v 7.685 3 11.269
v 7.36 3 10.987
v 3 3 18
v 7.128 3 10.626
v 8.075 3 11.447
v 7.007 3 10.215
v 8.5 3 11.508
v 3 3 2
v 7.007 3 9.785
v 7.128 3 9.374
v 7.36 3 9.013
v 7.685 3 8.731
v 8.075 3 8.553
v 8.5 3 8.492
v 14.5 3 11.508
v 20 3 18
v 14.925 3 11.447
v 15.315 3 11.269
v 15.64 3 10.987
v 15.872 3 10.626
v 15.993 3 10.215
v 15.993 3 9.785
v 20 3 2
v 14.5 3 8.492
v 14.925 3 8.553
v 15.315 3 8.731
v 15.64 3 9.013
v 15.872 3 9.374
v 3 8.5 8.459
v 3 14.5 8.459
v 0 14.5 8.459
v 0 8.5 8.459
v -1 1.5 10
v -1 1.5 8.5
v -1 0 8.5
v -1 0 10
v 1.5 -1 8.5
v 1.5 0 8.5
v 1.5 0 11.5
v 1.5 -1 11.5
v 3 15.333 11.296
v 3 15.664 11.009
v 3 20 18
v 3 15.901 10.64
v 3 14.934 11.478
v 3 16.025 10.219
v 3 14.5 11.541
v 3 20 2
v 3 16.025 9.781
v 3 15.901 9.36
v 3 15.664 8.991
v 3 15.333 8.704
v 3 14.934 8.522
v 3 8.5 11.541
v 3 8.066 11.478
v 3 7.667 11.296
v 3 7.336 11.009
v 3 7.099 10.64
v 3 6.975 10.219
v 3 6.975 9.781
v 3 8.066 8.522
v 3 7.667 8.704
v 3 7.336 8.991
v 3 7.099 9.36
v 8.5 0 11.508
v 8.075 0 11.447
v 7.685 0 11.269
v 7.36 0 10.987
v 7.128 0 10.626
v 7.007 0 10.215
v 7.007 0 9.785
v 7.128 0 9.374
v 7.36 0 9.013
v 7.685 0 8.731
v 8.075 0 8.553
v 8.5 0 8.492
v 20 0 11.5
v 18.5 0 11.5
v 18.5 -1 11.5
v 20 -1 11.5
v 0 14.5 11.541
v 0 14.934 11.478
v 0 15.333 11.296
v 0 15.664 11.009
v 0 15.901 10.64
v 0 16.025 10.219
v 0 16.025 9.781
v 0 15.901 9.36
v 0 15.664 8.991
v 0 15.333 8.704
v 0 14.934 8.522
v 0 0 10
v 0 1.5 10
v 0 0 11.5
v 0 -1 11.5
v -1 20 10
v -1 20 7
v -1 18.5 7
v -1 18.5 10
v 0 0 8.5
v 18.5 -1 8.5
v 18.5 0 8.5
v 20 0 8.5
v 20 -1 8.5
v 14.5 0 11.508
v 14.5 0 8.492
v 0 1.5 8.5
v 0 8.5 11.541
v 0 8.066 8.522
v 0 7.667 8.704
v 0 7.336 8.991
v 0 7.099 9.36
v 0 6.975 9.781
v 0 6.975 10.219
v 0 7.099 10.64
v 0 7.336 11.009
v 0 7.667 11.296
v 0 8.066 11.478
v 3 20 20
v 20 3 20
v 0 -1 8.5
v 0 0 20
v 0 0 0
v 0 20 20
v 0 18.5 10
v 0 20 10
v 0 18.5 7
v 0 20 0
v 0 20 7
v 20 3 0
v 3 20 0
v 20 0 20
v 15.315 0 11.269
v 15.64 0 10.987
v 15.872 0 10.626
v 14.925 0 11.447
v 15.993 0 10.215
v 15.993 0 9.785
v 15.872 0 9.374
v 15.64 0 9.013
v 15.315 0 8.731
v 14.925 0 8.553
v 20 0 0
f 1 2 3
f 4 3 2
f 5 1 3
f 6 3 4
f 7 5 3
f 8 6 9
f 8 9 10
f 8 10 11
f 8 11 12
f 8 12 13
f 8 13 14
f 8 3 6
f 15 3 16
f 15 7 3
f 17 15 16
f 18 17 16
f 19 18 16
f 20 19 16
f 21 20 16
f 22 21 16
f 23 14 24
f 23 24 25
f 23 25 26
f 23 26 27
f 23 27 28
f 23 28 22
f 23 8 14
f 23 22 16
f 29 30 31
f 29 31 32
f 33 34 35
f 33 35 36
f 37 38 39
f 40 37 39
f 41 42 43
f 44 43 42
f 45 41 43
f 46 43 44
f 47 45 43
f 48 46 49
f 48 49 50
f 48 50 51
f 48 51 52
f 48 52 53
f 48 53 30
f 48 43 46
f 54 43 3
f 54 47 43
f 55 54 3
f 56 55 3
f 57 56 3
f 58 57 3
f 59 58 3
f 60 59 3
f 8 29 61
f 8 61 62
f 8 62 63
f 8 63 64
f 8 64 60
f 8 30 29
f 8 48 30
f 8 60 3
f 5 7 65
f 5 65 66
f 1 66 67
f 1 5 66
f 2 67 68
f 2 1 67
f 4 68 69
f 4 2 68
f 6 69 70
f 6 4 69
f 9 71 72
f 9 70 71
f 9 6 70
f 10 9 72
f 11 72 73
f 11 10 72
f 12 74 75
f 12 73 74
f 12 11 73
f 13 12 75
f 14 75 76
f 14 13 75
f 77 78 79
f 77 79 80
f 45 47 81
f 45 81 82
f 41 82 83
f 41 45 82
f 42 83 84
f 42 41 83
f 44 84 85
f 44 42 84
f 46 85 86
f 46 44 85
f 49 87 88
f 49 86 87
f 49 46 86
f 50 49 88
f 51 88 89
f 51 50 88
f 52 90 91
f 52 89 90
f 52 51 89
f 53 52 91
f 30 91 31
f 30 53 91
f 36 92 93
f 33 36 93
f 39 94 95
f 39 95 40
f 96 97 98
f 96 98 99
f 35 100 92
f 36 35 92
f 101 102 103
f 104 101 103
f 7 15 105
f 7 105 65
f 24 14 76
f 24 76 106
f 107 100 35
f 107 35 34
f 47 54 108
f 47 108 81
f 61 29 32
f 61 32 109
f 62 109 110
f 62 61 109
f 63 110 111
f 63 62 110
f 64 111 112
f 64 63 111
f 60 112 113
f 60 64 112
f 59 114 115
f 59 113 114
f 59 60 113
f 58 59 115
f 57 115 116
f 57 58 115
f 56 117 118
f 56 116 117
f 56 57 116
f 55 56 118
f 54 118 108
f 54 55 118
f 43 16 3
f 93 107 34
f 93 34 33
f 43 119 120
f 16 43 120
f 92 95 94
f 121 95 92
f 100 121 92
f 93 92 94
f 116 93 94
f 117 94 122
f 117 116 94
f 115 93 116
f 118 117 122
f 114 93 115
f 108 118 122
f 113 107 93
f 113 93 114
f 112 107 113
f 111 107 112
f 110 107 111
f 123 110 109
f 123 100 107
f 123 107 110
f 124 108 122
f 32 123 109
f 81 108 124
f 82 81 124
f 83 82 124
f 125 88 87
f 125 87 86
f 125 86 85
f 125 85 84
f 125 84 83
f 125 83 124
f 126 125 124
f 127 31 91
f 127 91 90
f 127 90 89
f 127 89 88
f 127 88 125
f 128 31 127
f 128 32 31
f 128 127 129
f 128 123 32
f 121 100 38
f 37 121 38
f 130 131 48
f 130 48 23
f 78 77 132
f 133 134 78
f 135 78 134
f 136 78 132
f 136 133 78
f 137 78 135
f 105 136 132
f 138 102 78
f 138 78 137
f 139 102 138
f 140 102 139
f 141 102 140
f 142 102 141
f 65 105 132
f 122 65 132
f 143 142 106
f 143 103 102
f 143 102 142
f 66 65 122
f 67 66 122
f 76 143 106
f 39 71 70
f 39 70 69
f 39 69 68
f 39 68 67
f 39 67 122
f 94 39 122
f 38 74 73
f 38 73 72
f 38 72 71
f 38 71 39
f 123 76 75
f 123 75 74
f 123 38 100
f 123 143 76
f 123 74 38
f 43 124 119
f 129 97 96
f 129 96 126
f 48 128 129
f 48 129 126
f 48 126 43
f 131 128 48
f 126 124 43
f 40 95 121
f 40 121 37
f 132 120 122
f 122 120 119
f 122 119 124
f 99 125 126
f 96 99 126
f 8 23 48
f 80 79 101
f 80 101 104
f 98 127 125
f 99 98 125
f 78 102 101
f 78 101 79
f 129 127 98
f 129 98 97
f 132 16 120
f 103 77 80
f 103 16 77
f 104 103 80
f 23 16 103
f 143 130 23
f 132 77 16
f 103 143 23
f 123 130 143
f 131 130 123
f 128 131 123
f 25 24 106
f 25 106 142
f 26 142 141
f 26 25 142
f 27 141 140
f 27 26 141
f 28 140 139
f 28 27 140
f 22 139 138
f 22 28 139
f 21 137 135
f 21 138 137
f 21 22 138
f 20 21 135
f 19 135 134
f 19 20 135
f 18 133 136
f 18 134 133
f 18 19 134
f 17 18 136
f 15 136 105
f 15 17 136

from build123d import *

# Parameters (mm, degrees)
SALIENTE_EXTRUIR1_DEPTH = 20
SALIENTE_EXTRUIR2_DEPTH = 2
SALIENTE_EXTRUIR3_DEPTH = 2
CORTAR_EXTRUIR1_DEPTH   = 4
CORTAR_EXTRUIR2_DEPTH   = 4
CROQUIS6_W              = 1.5
CROQUIS6_H              = 3
SALIENTE_EXTRUIR4_DEPTH = 1
CROQUIS7_W              = 3
CROQUIS7_H              = 1.5
CROQUIS7_W_2            = 1.5
SALIENTE_EXTRUIR6_DEPTH = 1


with BuildPart() as part:
    # Croquis1 → Saliente-Extruir1 (new body)
    with BuildSketch(Plane.XY):
        Polygon((0, 20), (3, 20), (3, 3), (20, 3), (20, 0), (0, 0), align=None)
    extrude(amount=SALIENTE_EXTRUIR1_DEPTH)

    # Croquis2 → Saliente-Extruir2 (add)
    with BuildSketch(Plane.XY.offset(20)):
        Polygon((3, 20), (20, 3), (20, 0), (0, 0), (0, 20), align=None)
    extrude(amount=-SALIENTE_EXTRUIR2_DEPTH)

    # Croquis3 → Saliente-Extruir3 (add)
    with BuildSketch(Plane(origin=(0, 0, 0), x_dir=(-1, 0, 0), z_dir=(0, 0, -1))):
        Polygon((0, 20), (-3, 20), (-20, 3), (-20, 0), (0, 0), align=None)
    extrude(amount=-SALIENTE_EXTRUIR3_DEPTH)

    # Croquis4 → Cortar-Extruir1 (cut, through all)
    with BuildSketch(Plane(origin=(3, 0, 0), x_dir=(0, 0, -1), z_dir=(1, 0, 0))):
        with BuildLine():
            Line((-11.54072, 8.5), (-11.54072, 14.5))
            ThreePointArc((-11.54072, 14.5), (-10, 16.04072), (-8.45928, 14.5))
            Line((-8.45928, 14.5), (-8.45928, 8.5))
            ThreePointArc((-8.45928, 8.5), (-10, 6.95928), (-11.54072, 8.5))
        make_face()
    extrude(amount=-CORTAR_EXTRUIR1_DEPTH, mode=Mode.SUBTRACT)

    # Croquis5 → Cortar-Extruir2 (cut, through all)
    with BuildSketch(Plane(origin=(0, 3, 0), x_dir=(1, 0, 0), z_dir=(0, 1, 0))):
        with BuildLine():
            Line((8.5, -8.492105493), (14.5, -8.492105493))
            ThreePointArc((14.5, -8.492105493), (16.007894507, -10), (14.5, -11.507894507))
            Line((14.5, -11.507894507), (8.5, -11.507894507))
            ThreePointArc((8.5, -11.507894507), (6.992105493, -10), (8.5, -8.492105493))
        make_face()
    extrude(amount=-CORTAR_EXTRUIR2_DEPTH, mode=Mode.SUBTRACT)

    # Croquis6 → Saliente-Extruir4 (add)
    with BuildSketch(Plane.XZ):
        with Locations((0.75, 10)):
            Rectangle(CROQUIS6_W, CROQUIS6_H)
        with Locations((19.25, 10)):
            Rectangle(CROQUIS6_W, CROQUIS6_H)
    extrude(amount=SALIENTE_EXTRUIR4_DEPTH)

    # Croquis7 → Saliente-Extruir6 (add)
    with BuildSketch(Plane.ZY):
        with Locations((8.5, 19.25)):
            Rectangle(CROQUIS7_W, CROQUIS7_H)
        with Locations((9.25, 0.75)):
            Rectangle(CROQUIS7_W_2, CROQUIS7_H)
    extrude(amount=SALIENTE_EXTRUIR6_DEPTH)


solid = part.part
